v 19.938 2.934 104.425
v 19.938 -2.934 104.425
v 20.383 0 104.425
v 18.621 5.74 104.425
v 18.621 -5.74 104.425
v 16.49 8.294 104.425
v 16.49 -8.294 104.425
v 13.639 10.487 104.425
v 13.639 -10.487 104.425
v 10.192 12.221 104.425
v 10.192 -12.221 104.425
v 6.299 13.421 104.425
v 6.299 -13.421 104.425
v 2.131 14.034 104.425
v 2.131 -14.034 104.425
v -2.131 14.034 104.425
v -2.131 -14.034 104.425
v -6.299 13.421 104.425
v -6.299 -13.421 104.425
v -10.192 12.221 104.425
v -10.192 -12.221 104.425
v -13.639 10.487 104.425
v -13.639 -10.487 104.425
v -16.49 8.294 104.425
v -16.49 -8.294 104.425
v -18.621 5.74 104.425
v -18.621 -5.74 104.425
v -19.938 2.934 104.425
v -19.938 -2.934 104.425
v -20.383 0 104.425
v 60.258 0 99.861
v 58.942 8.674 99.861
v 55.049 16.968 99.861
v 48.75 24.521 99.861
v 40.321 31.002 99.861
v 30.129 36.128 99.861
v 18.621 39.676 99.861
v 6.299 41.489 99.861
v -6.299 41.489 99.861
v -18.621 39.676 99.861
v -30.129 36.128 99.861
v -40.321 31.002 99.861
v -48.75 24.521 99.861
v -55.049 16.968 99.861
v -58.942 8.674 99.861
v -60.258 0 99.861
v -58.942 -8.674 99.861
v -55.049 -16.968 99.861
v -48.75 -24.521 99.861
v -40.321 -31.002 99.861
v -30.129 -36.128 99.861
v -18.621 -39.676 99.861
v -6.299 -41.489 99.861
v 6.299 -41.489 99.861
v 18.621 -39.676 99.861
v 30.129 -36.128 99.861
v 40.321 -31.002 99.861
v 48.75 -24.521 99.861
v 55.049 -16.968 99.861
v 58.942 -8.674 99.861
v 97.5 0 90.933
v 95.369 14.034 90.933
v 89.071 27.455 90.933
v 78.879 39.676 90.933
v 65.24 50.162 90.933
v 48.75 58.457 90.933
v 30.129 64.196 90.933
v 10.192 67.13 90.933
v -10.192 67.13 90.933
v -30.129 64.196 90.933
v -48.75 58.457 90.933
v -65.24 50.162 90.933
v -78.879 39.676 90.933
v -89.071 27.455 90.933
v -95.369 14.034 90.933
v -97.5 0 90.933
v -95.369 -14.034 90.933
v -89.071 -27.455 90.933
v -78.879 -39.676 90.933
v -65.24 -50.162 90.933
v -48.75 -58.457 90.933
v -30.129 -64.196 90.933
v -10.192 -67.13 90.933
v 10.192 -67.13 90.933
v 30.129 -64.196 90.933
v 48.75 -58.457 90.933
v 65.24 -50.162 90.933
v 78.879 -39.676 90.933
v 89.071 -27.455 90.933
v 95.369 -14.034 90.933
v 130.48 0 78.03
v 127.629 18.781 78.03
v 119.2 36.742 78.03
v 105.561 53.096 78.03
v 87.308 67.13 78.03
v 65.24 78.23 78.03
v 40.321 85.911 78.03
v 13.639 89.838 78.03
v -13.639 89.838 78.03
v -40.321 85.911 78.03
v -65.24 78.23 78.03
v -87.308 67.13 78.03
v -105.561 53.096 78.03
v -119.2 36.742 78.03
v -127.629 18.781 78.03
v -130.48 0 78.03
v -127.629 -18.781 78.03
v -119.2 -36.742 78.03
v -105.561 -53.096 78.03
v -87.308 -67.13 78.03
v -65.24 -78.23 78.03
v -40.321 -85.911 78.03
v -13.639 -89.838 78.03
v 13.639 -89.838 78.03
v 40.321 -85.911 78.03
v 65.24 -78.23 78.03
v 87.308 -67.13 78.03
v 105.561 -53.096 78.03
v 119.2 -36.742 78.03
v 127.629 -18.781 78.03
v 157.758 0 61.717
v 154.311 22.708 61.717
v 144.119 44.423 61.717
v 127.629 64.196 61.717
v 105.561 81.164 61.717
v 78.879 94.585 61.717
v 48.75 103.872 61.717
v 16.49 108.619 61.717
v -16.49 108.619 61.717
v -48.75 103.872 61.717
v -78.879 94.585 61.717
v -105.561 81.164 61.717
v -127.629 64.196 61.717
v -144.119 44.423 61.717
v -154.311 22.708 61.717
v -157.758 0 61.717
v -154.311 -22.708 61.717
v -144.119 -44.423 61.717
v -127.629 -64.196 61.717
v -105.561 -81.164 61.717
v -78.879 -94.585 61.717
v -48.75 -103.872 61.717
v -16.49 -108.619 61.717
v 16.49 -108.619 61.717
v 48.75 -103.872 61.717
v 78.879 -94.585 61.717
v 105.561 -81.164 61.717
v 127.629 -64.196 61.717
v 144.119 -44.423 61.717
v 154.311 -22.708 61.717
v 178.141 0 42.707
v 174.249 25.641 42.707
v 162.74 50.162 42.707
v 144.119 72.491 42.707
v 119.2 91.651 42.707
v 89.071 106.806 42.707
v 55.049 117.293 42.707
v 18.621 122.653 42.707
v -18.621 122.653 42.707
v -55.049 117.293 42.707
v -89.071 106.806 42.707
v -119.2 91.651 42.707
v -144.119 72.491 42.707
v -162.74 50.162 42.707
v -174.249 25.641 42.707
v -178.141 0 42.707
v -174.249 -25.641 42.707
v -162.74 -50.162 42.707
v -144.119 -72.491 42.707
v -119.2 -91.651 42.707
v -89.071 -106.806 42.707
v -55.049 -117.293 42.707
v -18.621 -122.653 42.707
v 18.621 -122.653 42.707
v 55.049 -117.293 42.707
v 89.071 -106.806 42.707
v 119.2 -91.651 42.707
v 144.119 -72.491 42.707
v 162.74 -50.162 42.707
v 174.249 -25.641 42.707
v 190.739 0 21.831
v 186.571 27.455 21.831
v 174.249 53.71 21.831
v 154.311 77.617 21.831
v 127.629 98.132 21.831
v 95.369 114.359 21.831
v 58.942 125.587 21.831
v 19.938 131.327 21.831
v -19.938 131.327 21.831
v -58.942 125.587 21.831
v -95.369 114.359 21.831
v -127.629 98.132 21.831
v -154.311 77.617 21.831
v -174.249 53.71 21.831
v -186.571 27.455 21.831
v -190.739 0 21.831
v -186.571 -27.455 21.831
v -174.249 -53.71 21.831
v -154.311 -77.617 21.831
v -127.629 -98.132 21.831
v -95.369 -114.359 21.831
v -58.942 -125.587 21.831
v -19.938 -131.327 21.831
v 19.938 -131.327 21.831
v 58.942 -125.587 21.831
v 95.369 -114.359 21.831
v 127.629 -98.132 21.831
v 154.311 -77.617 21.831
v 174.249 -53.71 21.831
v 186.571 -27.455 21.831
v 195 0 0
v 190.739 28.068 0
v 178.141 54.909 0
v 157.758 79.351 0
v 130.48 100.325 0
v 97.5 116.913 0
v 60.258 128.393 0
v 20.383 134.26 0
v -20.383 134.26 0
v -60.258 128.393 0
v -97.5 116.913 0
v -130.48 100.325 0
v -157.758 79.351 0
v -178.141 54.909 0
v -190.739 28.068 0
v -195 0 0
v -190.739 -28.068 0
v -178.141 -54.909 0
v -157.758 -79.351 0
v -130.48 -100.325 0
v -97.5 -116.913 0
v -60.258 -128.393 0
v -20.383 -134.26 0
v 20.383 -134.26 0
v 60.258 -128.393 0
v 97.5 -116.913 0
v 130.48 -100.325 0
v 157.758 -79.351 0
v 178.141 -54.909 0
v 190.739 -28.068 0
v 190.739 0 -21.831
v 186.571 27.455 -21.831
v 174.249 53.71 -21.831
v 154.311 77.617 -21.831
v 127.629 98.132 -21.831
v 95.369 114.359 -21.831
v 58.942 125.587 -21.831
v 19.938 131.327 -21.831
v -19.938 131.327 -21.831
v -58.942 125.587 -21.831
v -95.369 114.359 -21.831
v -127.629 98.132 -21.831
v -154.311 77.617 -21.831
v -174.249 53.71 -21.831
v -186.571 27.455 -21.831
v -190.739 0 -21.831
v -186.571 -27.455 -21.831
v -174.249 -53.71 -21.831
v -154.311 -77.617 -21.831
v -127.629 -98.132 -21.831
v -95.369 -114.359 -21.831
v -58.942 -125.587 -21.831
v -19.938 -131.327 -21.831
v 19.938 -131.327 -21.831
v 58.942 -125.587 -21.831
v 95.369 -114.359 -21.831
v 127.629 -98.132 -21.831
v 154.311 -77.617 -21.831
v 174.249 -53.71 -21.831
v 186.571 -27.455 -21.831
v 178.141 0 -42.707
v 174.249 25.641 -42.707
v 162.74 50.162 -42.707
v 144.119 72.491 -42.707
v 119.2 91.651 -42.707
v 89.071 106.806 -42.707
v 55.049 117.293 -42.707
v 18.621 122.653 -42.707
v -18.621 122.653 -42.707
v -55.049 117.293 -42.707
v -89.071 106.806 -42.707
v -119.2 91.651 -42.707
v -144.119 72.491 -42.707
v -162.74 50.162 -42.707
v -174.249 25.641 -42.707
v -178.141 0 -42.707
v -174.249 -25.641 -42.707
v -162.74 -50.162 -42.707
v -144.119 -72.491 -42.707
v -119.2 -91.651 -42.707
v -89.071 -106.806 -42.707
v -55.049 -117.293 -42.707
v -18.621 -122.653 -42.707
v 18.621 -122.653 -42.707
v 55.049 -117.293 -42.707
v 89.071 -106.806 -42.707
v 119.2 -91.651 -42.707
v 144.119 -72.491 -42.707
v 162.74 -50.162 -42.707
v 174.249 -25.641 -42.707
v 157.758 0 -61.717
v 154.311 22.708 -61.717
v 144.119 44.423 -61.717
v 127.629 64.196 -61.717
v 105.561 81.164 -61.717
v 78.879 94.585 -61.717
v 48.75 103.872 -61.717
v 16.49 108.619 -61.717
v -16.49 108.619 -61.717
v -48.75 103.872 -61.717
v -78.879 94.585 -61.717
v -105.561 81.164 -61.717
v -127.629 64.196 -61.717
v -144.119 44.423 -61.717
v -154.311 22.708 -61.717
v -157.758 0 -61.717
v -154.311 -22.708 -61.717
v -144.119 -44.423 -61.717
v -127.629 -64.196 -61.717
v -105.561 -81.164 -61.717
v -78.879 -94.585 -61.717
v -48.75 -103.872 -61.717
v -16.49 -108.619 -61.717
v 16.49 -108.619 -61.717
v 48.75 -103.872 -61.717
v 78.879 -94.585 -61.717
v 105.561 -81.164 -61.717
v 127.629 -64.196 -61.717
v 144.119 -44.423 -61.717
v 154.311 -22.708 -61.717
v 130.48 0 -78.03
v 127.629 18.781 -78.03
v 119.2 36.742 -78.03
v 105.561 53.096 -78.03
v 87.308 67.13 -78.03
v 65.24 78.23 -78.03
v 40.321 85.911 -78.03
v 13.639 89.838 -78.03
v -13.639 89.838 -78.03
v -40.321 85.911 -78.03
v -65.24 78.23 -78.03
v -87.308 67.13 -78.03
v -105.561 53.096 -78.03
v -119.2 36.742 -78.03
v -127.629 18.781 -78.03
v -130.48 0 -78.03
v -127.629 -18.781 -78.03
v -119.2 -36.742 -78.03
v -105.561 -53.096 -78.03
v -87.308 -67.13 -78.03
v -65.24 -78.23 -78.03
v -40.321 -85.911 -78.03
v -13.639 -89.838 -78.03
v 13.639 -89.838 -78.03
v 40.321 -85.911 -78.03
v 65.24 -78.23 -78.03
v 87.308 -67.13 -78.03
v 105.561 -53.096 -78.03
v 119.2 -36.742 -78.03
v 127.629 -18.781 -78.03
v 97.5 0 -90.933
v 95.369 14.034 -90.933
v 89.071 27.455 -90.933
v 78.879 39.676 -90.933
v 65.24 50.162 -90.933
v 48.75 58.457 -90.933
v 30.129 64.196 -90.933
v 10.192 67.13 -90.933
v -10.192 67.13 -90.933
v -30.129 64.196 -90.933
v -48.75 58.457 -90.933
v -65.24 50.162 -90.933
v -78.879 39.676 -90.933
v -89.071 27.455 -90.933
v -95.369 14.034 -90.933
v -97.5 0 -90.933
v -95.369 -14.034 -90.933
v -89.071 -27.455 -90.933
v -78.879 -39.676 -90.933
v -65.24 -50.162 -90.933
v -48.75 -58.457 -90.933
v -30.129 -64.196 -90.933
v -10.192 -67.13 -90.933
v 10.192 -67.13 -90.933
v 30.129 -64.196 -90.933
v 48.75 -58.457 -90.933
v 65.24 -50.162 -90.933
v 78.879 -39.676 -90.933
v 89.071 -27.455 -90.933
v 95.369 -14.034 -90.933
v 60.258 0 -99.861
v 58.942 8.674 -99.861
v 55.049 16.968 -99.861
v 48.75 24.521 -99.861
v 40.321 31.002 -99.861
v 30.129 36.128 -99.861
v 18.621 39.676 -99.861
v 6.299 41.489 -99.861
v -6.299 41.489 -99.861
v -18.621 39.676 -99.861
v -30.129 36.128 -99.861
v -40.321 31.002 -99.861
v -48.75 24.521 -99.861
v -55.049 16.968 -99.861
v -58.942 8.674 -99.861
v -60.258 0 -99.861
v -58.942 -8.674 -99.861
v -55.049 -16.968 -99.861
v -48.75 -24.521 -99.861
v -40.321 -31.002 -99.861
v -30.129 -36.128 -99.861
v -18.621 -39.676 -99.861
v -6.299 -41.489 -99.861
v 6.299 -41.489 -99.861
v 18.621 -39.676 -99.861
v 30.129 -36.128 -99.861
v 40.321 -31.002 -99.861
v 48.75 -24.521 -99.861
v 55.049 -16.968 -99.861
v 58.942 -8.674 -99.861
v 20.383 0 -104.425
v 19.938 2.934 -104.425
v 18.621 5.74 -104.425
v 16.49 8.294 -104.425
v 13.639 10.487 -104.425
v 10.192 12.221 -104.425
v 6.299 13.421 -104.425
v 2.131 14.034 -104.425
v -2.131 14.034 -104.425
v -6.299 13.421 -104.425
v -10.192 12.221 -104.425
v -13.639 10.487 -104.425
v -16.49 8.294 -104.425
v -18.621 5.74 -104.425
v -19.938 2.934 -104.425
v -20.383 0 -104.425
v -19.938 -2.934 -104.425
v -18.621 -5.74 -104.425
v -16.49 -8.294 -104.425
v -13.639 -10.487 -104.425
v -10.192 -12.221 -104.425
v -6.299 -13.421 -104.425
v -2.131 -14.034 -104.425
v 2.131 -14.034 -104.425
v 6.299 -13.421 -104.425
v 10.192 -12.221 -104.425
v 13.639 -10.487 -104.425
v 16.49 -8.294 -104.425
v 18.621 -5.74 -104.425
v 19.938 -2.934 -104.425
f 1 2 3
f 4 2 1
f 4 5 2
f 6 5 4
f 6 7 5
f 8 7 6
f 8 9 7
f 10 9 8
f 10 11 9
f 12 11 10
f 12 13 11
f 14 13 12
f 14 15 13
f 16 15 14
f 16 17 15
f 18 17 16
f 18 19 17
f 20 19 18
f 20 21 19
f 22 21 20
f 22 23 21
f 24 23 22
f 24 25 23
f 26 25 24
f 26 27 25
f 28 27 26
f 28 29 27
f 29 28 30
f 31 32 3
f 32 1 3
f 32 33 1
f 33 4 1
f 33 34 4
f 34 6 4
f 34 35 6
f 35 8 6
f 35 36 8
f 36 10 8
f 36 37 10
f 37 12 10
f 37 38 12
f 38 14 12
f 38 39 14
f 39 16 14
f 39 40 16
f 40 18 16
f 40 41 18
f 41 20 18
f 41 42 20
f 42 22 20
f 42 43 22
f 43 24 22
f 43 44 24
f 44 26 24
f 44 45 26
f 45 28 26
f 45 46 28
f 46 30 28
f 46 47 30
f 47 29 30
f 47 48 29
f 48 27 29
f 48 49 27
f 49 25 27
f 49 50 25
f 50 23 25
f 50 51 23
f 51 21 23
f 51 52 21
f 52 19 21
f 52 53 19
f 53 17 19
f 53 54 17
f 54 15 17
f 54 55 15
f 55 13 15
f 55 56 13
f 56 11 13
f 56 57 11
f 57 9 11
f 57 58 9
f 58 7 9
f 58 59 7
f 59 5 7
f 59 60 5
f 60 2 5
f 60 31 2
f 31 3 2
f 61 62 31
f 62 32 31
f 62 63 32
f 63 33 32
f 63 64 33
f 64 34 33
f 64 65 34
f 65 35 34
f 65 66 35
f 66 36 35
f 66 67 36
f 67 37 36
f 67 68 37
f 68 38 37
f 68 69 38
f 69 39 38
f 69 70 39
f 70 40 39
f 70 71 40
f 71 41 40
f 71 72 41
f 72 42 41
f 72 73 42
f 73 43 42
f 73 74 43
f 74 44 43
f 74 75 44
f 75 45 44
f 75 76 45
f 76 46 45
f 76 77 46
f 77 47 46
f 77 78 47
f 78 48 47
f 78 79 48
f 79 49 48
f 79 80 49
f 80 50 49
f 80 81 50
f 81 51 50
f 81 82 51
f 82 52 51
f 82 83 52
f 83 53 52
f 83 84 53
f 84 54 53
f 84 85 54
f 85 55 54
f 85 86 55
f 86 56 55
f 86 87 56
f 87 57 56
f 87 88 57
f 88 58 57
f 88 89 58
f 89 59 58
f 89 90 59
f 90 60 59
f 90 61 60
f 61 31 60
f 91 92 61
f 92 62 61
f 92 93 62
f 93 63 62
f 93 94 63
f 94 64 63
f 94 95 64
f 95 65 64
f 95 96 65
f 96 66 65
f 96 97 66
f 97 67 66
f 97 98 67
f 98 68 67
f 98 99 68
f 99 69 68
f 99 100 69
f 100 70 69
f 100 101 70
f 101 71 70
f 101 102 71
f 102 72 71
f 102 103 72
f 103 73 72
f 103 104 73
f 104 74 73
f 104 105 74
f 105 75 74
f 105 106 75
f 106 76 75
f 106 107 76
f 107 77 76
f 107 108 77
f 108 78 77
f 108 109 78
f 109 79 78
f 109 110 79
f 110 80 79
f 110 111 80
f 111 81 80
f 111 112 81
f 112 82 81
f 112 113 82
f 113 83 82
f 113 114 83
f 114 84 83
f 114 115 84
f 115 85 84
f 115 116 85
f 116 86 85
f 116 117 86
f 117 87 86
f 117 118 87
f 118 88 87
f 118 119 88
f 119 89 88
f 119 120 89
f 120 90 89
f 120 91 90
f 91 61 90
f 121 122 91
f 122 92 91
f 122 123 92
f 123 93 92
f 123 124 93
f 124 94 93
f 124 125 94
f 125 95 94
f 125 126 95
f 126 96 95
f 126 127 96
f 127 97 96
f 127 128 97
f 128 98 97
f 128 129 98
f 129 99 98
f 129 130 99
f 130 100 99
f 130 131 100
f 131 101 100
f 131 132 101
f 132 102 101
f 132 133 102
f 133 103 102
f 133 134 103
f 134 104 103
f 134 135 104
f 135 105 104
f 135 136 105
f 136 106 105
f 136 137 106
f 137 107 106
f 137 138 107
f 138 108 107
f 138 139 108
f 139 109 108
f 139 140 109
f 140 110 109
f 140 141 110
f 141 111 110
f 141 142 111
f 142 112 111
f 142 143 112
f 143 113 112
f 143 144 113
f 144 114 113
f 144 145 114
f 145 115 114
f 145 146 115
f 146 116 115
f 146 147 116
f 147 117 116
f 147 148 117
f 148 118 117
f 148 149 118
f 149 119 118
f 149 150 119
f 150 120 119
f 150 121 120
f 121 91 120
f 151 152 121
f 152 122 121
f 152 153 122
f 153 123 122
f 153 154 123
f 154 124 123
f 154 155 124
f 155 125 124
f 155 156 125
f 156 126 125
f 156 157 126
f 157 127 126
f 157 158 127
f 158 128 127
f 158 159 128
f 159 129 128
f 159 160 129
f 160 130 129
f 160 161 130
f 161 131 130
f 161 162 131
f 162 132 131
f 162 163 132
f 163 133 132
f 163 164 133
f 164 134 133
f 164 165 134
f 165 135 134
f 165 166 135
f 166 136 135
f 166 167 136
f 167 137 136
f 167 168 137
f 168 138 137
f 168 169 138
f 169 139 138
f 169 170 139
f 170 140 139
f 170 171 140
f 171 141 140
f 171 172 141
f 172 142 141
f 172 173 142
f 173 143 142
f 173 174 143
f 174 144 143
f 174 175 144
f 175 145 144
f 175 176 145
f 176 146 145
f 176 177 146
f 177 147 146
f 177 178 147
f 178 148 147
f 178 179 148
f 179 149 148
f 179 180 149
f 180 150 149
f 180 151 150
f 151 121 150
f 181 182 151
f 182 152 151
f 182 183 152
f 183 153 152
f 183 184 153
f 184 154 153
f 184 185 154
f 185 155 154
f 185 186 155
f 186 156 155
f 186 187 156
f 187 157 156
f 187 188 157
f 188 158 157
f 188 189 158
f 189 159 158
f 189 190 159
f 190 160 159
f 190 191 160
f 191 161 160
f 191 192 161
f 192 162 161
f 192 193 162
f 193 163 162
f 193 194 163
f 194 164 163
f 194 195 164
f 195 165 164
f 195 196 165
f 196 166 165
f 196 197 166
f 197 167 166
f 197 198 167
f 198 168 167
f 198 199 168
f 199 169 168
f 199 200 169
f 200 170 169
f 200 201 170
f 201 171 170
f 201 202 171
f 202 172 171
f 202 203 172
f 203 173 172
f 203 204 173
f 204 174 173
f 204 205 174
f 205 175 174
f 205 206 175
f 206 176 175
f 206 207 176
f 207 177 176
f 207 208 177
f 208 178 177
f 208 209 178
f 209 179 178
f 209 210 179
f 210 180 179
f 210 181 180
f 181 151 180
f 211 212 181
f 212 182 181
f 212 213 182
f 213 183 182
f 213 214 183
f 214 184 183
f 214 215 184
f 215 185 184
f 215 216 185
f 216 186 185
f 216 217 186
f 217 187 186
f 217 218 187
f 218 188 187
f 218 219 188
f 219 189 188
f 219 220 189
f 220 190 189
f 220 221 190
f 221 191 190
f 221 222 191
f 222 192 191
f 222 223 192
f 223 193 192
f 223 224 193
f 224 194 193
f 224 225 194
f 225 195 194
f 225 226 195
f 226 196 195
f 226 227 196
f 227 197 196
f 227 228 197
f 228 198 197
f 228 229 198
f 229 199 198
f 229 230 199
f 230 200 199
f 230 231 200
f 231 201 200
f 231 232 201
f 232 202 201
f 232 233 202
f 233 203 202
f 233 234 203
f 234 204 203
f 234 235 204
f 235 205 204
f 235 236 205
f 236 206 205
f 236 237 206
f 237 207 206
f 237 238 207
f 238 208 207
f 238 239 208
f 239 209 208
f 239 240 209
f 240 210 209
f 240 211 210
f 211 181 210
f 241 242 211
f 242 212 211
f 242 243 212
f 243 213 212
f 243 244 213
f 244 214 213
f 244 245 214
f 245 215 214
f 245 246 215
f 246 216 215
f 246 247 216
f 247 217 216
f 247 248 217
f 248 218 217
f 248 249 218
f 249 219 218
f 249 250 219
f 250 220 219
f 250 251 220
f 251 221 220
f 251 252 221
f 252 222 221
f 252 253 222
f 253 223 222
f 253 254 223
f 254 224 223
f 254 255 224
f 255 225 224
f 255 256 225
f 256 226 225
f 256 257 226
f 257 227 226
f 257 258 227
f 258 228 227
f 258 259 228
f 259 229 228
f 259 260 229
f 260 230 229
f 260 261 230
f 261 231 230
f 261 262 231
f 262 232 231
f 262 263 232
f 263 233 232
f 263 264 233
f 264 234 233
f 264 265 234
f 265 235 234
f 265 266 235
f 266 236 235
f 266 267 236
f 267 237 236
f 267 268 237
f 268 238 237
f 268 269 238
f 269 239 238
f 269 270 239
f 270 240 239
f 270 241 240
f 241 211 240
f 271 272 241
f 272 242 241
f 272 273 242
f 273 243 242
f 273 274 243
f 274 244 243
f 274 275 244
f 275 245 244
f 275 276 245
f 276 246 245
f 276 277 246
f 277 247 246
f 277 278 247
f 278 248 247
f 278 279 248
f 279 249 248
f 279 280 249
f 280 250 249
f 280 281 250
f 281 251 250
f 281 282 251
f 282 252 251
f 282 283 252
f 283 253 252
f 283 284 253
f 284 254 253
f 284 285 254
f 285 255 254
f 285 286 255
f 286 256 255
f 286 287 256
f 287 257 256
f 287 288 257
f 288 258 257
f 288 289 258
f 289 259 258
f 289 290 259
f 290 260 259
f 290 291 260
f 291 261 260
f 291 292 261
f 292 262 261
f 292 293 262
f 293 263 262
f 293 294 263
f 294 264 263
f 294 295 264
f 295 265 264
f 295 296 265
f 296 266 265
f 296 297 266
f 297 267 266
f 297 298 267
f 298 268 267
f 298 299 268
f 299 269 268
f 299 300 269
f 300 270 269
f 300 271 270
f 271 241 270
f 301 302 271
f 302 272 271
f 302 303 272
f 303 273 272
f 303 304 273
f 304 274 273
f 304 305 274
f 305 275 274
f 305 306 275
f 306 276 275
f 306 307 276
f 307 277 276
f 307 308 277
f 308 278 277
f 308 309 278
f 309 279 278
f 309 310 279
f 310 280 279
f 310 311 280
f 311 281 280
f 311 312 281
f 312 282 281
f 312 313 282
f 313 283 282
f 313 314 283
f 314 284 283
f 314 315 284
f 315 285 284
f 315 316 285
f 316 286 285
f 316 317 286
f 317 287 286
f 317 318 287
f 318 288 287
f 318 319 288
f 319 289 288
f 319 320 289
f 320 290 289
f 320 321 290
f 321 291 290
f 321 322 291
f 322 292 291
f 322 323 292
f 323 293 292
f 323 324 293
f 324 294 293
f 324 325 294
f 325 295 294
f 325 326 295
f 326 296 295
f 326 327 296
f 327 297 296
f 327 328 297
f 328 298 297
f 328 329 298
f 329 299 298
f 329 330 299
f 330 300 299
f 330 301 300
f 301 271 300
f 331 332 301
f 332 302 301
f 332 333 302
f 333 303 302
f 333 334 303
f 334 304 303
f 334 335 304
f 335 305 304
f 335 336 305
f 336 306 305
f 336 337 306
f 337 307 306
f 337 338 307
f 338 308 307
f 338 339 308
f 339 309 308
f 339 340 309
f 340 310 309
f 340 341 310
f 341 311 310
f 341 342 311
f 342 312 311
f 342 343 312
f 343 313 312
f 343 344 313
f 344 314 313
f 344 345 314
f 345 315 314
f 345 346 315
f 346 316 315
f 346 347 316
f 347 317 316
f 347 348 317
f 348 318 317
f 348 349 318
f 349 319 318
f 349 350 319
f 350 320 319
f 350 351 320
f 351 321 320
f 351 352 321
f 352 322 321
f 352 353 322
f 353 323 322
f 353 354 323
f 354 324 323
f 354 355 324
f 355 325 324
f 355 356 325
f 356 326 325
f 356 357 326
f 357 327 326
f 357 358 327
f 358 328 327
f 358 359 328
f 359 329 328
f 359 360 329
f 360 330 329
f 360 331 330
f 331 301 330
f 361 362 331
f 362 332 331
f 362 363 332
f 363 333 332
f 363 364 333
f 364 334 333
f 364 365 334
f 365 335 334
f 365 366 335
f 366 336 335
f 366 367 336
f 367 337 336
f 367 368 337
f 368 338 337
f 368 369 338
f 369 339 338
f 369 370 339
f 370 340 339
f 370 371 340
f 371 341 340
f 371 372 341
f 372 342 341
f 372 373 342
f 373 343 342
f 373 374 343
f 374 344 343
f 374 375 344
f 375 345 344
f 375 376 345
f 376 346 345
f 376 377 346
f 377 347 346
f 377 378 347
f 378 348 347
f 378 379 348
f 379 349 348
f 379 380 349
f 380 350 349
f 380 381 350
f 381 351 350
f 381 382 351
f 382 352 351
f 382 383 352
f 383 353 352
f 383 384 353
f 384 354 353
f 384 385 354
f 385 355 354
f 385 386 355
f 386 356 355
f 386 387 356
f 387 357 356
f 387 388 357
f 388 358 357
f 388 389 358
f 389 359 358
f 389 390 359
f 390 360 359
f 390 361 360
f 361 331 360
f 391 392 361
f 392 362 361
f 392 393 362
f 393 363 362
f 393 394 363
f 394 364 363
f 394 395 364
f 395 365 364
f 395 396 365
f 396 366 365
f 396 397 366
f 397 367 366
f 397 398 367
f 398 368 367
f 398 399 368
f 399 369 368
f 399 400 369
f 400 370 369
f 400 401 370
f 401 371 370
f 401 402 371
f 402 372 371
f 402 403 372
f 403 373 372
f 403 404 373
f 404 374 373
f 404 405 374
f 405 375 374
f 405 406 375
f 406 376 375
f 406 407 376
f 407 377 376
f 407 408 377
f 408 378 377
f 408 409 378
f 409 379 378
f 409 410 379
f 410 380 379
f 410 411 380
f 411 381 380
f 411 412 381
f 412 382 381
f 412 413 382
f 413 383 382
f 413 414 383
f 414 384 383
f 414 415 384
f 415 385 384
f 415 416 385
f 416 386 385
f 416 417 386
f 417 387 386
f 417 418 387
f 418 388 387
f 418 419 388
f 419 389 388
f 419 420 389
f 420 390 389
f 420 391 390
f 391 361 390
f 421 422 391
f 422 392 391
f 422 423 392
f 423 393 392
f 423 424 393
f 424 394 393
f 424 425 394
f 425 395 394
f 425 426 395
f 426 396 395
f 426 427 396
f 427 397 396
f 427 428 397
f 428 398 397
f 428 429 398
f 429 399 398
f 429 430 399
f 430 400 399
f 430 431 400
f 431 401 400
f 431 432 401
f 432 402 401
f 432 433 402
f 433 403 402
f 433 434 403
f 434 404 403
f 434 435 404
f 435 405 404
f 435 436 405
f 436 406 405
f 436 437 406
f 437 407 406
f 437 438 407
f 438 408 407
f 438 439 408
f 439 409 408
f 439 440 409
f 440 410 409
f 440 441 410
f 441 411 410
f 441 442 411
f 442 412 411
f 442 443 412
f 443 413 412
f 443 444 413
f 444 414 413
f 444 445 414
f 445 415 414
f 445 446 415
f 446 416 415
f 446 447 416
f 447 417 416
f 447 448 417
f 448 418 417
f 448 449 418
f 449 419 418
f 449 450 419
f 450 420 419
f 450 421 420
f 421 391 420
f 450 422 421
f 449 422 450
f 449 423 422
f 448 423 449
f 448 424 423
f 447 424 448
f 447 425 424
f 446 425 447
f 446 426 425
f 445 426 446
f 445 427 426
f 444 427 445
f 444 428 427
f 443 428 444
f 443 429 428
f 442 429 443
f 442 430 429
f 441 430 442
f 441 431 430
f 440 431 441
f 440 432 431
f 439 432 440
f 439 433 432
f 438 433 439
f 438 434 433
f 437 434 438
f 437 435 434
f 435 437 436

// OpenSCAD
// Generated by SolidPython 1.0.1 on 2020-07-29 00:46:50


scale(v = [13, 9, 7]) {
	sphere(r = 15);
}
/***********************************************
*********      SolidPython code:      **********
************************************************
 
# import packages: SolidPython
from solid import *
from solid.utils import *
from itertools import chain, combinations, permutations


class Resize:

    def __init__(self, scad_file):
        self.scad_file = scad_file
        #self.scad_file = import_scad(scad_file)
        # cone/cylinder param:
        self.r1 = 0
        self.r2 = 0
        self.h = 0
        # rectangular prism param:
        self.w = 0
        self.l = 0
        # ellipse param:
        self.r = 0

    # import OpenScad code (file name corresponds to shape)


    # classify shape + parameters
    def assign(self, param1, param2, param3):
        if self.scad_file == 'cone.scad':
            self.r1 = param1
            self.r2 = param2
            self.h = param3
        elif self.scad_file == 'cylinder.scad':
            self.r1 = param1
            self.r2 = param2
            self.h = param3
        elif self.scad_file == 'rectangularPrism.scad':
            self.h = param1
            self.l = param2
            self.w = param3
        else:
            self.r = param1
            self.h = param2

    # resize parameters
    def iterate(self):
        x = range(3, 20, 2)
        i = 1
        if self.scad_file == 'cone.scad':
            tempList = list(permutations(x, 2))
            for temp in tempList:
                param1 = temp[0]
                param2 = temp[1]
                filepath = 'produced_scad_files/' + 'cone' + str(param1) + '_' + str(param2) + '_' + '.scad'
                scad_render_to_file(cylinder(h=param1, r1=param2, r2=0), filepath)

        elif self.scad_file == 'cylinder.scad':
            tempList = list(permutations(x, 3))
            for temp in tempList:
                param1 = temp[0]
                param2 = temp[1]
                filepath = 'produced_scad_files/' + 'cylinder' + str(param1) + '_' + str(param2) + '_' + '.scad'
                scad_render_to_file(cylinder(h=param1, r1=param2, r2=param2), filepath)

        elif self.scad_file == 'rectangularPrism.scad':
            tempList = list(permutations(x, 3))
            for temp in tempList:
                param1 = temp[0]
                param2 = temp[1]
                param3 = temp[2]
                filepath = 'produced_scad_files/' + 'rectangularPrism' + str(param1) + '_' + str(param2) + '_' + str(
                    param3) + '.scad'
                scad_render_to_file(cube(size=(param1, param2, param3)), filepath)

        elif self.scad_file == 'ellipse.scad':
            tempList = list(permutations(x, 4))
            for temp in tempList:
                param1 = temp[0]
                param2 = temp[1]
                param3 = temp[2]
                param4 = temp[3]
                filepath = 'produced_scad_files/' + 'ellipse' + str(param1) + '_' + str(param2) + '_' + str(param3) + '_' + str(param4) + '.scad'
                scad_render_to_file(scale([param1, param2, param3])(sphere(r=param4)), filepath)

    def render_to_scadfile(self):
        scad_render_to_file(scad, 'example.scad') 
 
************************************************/
